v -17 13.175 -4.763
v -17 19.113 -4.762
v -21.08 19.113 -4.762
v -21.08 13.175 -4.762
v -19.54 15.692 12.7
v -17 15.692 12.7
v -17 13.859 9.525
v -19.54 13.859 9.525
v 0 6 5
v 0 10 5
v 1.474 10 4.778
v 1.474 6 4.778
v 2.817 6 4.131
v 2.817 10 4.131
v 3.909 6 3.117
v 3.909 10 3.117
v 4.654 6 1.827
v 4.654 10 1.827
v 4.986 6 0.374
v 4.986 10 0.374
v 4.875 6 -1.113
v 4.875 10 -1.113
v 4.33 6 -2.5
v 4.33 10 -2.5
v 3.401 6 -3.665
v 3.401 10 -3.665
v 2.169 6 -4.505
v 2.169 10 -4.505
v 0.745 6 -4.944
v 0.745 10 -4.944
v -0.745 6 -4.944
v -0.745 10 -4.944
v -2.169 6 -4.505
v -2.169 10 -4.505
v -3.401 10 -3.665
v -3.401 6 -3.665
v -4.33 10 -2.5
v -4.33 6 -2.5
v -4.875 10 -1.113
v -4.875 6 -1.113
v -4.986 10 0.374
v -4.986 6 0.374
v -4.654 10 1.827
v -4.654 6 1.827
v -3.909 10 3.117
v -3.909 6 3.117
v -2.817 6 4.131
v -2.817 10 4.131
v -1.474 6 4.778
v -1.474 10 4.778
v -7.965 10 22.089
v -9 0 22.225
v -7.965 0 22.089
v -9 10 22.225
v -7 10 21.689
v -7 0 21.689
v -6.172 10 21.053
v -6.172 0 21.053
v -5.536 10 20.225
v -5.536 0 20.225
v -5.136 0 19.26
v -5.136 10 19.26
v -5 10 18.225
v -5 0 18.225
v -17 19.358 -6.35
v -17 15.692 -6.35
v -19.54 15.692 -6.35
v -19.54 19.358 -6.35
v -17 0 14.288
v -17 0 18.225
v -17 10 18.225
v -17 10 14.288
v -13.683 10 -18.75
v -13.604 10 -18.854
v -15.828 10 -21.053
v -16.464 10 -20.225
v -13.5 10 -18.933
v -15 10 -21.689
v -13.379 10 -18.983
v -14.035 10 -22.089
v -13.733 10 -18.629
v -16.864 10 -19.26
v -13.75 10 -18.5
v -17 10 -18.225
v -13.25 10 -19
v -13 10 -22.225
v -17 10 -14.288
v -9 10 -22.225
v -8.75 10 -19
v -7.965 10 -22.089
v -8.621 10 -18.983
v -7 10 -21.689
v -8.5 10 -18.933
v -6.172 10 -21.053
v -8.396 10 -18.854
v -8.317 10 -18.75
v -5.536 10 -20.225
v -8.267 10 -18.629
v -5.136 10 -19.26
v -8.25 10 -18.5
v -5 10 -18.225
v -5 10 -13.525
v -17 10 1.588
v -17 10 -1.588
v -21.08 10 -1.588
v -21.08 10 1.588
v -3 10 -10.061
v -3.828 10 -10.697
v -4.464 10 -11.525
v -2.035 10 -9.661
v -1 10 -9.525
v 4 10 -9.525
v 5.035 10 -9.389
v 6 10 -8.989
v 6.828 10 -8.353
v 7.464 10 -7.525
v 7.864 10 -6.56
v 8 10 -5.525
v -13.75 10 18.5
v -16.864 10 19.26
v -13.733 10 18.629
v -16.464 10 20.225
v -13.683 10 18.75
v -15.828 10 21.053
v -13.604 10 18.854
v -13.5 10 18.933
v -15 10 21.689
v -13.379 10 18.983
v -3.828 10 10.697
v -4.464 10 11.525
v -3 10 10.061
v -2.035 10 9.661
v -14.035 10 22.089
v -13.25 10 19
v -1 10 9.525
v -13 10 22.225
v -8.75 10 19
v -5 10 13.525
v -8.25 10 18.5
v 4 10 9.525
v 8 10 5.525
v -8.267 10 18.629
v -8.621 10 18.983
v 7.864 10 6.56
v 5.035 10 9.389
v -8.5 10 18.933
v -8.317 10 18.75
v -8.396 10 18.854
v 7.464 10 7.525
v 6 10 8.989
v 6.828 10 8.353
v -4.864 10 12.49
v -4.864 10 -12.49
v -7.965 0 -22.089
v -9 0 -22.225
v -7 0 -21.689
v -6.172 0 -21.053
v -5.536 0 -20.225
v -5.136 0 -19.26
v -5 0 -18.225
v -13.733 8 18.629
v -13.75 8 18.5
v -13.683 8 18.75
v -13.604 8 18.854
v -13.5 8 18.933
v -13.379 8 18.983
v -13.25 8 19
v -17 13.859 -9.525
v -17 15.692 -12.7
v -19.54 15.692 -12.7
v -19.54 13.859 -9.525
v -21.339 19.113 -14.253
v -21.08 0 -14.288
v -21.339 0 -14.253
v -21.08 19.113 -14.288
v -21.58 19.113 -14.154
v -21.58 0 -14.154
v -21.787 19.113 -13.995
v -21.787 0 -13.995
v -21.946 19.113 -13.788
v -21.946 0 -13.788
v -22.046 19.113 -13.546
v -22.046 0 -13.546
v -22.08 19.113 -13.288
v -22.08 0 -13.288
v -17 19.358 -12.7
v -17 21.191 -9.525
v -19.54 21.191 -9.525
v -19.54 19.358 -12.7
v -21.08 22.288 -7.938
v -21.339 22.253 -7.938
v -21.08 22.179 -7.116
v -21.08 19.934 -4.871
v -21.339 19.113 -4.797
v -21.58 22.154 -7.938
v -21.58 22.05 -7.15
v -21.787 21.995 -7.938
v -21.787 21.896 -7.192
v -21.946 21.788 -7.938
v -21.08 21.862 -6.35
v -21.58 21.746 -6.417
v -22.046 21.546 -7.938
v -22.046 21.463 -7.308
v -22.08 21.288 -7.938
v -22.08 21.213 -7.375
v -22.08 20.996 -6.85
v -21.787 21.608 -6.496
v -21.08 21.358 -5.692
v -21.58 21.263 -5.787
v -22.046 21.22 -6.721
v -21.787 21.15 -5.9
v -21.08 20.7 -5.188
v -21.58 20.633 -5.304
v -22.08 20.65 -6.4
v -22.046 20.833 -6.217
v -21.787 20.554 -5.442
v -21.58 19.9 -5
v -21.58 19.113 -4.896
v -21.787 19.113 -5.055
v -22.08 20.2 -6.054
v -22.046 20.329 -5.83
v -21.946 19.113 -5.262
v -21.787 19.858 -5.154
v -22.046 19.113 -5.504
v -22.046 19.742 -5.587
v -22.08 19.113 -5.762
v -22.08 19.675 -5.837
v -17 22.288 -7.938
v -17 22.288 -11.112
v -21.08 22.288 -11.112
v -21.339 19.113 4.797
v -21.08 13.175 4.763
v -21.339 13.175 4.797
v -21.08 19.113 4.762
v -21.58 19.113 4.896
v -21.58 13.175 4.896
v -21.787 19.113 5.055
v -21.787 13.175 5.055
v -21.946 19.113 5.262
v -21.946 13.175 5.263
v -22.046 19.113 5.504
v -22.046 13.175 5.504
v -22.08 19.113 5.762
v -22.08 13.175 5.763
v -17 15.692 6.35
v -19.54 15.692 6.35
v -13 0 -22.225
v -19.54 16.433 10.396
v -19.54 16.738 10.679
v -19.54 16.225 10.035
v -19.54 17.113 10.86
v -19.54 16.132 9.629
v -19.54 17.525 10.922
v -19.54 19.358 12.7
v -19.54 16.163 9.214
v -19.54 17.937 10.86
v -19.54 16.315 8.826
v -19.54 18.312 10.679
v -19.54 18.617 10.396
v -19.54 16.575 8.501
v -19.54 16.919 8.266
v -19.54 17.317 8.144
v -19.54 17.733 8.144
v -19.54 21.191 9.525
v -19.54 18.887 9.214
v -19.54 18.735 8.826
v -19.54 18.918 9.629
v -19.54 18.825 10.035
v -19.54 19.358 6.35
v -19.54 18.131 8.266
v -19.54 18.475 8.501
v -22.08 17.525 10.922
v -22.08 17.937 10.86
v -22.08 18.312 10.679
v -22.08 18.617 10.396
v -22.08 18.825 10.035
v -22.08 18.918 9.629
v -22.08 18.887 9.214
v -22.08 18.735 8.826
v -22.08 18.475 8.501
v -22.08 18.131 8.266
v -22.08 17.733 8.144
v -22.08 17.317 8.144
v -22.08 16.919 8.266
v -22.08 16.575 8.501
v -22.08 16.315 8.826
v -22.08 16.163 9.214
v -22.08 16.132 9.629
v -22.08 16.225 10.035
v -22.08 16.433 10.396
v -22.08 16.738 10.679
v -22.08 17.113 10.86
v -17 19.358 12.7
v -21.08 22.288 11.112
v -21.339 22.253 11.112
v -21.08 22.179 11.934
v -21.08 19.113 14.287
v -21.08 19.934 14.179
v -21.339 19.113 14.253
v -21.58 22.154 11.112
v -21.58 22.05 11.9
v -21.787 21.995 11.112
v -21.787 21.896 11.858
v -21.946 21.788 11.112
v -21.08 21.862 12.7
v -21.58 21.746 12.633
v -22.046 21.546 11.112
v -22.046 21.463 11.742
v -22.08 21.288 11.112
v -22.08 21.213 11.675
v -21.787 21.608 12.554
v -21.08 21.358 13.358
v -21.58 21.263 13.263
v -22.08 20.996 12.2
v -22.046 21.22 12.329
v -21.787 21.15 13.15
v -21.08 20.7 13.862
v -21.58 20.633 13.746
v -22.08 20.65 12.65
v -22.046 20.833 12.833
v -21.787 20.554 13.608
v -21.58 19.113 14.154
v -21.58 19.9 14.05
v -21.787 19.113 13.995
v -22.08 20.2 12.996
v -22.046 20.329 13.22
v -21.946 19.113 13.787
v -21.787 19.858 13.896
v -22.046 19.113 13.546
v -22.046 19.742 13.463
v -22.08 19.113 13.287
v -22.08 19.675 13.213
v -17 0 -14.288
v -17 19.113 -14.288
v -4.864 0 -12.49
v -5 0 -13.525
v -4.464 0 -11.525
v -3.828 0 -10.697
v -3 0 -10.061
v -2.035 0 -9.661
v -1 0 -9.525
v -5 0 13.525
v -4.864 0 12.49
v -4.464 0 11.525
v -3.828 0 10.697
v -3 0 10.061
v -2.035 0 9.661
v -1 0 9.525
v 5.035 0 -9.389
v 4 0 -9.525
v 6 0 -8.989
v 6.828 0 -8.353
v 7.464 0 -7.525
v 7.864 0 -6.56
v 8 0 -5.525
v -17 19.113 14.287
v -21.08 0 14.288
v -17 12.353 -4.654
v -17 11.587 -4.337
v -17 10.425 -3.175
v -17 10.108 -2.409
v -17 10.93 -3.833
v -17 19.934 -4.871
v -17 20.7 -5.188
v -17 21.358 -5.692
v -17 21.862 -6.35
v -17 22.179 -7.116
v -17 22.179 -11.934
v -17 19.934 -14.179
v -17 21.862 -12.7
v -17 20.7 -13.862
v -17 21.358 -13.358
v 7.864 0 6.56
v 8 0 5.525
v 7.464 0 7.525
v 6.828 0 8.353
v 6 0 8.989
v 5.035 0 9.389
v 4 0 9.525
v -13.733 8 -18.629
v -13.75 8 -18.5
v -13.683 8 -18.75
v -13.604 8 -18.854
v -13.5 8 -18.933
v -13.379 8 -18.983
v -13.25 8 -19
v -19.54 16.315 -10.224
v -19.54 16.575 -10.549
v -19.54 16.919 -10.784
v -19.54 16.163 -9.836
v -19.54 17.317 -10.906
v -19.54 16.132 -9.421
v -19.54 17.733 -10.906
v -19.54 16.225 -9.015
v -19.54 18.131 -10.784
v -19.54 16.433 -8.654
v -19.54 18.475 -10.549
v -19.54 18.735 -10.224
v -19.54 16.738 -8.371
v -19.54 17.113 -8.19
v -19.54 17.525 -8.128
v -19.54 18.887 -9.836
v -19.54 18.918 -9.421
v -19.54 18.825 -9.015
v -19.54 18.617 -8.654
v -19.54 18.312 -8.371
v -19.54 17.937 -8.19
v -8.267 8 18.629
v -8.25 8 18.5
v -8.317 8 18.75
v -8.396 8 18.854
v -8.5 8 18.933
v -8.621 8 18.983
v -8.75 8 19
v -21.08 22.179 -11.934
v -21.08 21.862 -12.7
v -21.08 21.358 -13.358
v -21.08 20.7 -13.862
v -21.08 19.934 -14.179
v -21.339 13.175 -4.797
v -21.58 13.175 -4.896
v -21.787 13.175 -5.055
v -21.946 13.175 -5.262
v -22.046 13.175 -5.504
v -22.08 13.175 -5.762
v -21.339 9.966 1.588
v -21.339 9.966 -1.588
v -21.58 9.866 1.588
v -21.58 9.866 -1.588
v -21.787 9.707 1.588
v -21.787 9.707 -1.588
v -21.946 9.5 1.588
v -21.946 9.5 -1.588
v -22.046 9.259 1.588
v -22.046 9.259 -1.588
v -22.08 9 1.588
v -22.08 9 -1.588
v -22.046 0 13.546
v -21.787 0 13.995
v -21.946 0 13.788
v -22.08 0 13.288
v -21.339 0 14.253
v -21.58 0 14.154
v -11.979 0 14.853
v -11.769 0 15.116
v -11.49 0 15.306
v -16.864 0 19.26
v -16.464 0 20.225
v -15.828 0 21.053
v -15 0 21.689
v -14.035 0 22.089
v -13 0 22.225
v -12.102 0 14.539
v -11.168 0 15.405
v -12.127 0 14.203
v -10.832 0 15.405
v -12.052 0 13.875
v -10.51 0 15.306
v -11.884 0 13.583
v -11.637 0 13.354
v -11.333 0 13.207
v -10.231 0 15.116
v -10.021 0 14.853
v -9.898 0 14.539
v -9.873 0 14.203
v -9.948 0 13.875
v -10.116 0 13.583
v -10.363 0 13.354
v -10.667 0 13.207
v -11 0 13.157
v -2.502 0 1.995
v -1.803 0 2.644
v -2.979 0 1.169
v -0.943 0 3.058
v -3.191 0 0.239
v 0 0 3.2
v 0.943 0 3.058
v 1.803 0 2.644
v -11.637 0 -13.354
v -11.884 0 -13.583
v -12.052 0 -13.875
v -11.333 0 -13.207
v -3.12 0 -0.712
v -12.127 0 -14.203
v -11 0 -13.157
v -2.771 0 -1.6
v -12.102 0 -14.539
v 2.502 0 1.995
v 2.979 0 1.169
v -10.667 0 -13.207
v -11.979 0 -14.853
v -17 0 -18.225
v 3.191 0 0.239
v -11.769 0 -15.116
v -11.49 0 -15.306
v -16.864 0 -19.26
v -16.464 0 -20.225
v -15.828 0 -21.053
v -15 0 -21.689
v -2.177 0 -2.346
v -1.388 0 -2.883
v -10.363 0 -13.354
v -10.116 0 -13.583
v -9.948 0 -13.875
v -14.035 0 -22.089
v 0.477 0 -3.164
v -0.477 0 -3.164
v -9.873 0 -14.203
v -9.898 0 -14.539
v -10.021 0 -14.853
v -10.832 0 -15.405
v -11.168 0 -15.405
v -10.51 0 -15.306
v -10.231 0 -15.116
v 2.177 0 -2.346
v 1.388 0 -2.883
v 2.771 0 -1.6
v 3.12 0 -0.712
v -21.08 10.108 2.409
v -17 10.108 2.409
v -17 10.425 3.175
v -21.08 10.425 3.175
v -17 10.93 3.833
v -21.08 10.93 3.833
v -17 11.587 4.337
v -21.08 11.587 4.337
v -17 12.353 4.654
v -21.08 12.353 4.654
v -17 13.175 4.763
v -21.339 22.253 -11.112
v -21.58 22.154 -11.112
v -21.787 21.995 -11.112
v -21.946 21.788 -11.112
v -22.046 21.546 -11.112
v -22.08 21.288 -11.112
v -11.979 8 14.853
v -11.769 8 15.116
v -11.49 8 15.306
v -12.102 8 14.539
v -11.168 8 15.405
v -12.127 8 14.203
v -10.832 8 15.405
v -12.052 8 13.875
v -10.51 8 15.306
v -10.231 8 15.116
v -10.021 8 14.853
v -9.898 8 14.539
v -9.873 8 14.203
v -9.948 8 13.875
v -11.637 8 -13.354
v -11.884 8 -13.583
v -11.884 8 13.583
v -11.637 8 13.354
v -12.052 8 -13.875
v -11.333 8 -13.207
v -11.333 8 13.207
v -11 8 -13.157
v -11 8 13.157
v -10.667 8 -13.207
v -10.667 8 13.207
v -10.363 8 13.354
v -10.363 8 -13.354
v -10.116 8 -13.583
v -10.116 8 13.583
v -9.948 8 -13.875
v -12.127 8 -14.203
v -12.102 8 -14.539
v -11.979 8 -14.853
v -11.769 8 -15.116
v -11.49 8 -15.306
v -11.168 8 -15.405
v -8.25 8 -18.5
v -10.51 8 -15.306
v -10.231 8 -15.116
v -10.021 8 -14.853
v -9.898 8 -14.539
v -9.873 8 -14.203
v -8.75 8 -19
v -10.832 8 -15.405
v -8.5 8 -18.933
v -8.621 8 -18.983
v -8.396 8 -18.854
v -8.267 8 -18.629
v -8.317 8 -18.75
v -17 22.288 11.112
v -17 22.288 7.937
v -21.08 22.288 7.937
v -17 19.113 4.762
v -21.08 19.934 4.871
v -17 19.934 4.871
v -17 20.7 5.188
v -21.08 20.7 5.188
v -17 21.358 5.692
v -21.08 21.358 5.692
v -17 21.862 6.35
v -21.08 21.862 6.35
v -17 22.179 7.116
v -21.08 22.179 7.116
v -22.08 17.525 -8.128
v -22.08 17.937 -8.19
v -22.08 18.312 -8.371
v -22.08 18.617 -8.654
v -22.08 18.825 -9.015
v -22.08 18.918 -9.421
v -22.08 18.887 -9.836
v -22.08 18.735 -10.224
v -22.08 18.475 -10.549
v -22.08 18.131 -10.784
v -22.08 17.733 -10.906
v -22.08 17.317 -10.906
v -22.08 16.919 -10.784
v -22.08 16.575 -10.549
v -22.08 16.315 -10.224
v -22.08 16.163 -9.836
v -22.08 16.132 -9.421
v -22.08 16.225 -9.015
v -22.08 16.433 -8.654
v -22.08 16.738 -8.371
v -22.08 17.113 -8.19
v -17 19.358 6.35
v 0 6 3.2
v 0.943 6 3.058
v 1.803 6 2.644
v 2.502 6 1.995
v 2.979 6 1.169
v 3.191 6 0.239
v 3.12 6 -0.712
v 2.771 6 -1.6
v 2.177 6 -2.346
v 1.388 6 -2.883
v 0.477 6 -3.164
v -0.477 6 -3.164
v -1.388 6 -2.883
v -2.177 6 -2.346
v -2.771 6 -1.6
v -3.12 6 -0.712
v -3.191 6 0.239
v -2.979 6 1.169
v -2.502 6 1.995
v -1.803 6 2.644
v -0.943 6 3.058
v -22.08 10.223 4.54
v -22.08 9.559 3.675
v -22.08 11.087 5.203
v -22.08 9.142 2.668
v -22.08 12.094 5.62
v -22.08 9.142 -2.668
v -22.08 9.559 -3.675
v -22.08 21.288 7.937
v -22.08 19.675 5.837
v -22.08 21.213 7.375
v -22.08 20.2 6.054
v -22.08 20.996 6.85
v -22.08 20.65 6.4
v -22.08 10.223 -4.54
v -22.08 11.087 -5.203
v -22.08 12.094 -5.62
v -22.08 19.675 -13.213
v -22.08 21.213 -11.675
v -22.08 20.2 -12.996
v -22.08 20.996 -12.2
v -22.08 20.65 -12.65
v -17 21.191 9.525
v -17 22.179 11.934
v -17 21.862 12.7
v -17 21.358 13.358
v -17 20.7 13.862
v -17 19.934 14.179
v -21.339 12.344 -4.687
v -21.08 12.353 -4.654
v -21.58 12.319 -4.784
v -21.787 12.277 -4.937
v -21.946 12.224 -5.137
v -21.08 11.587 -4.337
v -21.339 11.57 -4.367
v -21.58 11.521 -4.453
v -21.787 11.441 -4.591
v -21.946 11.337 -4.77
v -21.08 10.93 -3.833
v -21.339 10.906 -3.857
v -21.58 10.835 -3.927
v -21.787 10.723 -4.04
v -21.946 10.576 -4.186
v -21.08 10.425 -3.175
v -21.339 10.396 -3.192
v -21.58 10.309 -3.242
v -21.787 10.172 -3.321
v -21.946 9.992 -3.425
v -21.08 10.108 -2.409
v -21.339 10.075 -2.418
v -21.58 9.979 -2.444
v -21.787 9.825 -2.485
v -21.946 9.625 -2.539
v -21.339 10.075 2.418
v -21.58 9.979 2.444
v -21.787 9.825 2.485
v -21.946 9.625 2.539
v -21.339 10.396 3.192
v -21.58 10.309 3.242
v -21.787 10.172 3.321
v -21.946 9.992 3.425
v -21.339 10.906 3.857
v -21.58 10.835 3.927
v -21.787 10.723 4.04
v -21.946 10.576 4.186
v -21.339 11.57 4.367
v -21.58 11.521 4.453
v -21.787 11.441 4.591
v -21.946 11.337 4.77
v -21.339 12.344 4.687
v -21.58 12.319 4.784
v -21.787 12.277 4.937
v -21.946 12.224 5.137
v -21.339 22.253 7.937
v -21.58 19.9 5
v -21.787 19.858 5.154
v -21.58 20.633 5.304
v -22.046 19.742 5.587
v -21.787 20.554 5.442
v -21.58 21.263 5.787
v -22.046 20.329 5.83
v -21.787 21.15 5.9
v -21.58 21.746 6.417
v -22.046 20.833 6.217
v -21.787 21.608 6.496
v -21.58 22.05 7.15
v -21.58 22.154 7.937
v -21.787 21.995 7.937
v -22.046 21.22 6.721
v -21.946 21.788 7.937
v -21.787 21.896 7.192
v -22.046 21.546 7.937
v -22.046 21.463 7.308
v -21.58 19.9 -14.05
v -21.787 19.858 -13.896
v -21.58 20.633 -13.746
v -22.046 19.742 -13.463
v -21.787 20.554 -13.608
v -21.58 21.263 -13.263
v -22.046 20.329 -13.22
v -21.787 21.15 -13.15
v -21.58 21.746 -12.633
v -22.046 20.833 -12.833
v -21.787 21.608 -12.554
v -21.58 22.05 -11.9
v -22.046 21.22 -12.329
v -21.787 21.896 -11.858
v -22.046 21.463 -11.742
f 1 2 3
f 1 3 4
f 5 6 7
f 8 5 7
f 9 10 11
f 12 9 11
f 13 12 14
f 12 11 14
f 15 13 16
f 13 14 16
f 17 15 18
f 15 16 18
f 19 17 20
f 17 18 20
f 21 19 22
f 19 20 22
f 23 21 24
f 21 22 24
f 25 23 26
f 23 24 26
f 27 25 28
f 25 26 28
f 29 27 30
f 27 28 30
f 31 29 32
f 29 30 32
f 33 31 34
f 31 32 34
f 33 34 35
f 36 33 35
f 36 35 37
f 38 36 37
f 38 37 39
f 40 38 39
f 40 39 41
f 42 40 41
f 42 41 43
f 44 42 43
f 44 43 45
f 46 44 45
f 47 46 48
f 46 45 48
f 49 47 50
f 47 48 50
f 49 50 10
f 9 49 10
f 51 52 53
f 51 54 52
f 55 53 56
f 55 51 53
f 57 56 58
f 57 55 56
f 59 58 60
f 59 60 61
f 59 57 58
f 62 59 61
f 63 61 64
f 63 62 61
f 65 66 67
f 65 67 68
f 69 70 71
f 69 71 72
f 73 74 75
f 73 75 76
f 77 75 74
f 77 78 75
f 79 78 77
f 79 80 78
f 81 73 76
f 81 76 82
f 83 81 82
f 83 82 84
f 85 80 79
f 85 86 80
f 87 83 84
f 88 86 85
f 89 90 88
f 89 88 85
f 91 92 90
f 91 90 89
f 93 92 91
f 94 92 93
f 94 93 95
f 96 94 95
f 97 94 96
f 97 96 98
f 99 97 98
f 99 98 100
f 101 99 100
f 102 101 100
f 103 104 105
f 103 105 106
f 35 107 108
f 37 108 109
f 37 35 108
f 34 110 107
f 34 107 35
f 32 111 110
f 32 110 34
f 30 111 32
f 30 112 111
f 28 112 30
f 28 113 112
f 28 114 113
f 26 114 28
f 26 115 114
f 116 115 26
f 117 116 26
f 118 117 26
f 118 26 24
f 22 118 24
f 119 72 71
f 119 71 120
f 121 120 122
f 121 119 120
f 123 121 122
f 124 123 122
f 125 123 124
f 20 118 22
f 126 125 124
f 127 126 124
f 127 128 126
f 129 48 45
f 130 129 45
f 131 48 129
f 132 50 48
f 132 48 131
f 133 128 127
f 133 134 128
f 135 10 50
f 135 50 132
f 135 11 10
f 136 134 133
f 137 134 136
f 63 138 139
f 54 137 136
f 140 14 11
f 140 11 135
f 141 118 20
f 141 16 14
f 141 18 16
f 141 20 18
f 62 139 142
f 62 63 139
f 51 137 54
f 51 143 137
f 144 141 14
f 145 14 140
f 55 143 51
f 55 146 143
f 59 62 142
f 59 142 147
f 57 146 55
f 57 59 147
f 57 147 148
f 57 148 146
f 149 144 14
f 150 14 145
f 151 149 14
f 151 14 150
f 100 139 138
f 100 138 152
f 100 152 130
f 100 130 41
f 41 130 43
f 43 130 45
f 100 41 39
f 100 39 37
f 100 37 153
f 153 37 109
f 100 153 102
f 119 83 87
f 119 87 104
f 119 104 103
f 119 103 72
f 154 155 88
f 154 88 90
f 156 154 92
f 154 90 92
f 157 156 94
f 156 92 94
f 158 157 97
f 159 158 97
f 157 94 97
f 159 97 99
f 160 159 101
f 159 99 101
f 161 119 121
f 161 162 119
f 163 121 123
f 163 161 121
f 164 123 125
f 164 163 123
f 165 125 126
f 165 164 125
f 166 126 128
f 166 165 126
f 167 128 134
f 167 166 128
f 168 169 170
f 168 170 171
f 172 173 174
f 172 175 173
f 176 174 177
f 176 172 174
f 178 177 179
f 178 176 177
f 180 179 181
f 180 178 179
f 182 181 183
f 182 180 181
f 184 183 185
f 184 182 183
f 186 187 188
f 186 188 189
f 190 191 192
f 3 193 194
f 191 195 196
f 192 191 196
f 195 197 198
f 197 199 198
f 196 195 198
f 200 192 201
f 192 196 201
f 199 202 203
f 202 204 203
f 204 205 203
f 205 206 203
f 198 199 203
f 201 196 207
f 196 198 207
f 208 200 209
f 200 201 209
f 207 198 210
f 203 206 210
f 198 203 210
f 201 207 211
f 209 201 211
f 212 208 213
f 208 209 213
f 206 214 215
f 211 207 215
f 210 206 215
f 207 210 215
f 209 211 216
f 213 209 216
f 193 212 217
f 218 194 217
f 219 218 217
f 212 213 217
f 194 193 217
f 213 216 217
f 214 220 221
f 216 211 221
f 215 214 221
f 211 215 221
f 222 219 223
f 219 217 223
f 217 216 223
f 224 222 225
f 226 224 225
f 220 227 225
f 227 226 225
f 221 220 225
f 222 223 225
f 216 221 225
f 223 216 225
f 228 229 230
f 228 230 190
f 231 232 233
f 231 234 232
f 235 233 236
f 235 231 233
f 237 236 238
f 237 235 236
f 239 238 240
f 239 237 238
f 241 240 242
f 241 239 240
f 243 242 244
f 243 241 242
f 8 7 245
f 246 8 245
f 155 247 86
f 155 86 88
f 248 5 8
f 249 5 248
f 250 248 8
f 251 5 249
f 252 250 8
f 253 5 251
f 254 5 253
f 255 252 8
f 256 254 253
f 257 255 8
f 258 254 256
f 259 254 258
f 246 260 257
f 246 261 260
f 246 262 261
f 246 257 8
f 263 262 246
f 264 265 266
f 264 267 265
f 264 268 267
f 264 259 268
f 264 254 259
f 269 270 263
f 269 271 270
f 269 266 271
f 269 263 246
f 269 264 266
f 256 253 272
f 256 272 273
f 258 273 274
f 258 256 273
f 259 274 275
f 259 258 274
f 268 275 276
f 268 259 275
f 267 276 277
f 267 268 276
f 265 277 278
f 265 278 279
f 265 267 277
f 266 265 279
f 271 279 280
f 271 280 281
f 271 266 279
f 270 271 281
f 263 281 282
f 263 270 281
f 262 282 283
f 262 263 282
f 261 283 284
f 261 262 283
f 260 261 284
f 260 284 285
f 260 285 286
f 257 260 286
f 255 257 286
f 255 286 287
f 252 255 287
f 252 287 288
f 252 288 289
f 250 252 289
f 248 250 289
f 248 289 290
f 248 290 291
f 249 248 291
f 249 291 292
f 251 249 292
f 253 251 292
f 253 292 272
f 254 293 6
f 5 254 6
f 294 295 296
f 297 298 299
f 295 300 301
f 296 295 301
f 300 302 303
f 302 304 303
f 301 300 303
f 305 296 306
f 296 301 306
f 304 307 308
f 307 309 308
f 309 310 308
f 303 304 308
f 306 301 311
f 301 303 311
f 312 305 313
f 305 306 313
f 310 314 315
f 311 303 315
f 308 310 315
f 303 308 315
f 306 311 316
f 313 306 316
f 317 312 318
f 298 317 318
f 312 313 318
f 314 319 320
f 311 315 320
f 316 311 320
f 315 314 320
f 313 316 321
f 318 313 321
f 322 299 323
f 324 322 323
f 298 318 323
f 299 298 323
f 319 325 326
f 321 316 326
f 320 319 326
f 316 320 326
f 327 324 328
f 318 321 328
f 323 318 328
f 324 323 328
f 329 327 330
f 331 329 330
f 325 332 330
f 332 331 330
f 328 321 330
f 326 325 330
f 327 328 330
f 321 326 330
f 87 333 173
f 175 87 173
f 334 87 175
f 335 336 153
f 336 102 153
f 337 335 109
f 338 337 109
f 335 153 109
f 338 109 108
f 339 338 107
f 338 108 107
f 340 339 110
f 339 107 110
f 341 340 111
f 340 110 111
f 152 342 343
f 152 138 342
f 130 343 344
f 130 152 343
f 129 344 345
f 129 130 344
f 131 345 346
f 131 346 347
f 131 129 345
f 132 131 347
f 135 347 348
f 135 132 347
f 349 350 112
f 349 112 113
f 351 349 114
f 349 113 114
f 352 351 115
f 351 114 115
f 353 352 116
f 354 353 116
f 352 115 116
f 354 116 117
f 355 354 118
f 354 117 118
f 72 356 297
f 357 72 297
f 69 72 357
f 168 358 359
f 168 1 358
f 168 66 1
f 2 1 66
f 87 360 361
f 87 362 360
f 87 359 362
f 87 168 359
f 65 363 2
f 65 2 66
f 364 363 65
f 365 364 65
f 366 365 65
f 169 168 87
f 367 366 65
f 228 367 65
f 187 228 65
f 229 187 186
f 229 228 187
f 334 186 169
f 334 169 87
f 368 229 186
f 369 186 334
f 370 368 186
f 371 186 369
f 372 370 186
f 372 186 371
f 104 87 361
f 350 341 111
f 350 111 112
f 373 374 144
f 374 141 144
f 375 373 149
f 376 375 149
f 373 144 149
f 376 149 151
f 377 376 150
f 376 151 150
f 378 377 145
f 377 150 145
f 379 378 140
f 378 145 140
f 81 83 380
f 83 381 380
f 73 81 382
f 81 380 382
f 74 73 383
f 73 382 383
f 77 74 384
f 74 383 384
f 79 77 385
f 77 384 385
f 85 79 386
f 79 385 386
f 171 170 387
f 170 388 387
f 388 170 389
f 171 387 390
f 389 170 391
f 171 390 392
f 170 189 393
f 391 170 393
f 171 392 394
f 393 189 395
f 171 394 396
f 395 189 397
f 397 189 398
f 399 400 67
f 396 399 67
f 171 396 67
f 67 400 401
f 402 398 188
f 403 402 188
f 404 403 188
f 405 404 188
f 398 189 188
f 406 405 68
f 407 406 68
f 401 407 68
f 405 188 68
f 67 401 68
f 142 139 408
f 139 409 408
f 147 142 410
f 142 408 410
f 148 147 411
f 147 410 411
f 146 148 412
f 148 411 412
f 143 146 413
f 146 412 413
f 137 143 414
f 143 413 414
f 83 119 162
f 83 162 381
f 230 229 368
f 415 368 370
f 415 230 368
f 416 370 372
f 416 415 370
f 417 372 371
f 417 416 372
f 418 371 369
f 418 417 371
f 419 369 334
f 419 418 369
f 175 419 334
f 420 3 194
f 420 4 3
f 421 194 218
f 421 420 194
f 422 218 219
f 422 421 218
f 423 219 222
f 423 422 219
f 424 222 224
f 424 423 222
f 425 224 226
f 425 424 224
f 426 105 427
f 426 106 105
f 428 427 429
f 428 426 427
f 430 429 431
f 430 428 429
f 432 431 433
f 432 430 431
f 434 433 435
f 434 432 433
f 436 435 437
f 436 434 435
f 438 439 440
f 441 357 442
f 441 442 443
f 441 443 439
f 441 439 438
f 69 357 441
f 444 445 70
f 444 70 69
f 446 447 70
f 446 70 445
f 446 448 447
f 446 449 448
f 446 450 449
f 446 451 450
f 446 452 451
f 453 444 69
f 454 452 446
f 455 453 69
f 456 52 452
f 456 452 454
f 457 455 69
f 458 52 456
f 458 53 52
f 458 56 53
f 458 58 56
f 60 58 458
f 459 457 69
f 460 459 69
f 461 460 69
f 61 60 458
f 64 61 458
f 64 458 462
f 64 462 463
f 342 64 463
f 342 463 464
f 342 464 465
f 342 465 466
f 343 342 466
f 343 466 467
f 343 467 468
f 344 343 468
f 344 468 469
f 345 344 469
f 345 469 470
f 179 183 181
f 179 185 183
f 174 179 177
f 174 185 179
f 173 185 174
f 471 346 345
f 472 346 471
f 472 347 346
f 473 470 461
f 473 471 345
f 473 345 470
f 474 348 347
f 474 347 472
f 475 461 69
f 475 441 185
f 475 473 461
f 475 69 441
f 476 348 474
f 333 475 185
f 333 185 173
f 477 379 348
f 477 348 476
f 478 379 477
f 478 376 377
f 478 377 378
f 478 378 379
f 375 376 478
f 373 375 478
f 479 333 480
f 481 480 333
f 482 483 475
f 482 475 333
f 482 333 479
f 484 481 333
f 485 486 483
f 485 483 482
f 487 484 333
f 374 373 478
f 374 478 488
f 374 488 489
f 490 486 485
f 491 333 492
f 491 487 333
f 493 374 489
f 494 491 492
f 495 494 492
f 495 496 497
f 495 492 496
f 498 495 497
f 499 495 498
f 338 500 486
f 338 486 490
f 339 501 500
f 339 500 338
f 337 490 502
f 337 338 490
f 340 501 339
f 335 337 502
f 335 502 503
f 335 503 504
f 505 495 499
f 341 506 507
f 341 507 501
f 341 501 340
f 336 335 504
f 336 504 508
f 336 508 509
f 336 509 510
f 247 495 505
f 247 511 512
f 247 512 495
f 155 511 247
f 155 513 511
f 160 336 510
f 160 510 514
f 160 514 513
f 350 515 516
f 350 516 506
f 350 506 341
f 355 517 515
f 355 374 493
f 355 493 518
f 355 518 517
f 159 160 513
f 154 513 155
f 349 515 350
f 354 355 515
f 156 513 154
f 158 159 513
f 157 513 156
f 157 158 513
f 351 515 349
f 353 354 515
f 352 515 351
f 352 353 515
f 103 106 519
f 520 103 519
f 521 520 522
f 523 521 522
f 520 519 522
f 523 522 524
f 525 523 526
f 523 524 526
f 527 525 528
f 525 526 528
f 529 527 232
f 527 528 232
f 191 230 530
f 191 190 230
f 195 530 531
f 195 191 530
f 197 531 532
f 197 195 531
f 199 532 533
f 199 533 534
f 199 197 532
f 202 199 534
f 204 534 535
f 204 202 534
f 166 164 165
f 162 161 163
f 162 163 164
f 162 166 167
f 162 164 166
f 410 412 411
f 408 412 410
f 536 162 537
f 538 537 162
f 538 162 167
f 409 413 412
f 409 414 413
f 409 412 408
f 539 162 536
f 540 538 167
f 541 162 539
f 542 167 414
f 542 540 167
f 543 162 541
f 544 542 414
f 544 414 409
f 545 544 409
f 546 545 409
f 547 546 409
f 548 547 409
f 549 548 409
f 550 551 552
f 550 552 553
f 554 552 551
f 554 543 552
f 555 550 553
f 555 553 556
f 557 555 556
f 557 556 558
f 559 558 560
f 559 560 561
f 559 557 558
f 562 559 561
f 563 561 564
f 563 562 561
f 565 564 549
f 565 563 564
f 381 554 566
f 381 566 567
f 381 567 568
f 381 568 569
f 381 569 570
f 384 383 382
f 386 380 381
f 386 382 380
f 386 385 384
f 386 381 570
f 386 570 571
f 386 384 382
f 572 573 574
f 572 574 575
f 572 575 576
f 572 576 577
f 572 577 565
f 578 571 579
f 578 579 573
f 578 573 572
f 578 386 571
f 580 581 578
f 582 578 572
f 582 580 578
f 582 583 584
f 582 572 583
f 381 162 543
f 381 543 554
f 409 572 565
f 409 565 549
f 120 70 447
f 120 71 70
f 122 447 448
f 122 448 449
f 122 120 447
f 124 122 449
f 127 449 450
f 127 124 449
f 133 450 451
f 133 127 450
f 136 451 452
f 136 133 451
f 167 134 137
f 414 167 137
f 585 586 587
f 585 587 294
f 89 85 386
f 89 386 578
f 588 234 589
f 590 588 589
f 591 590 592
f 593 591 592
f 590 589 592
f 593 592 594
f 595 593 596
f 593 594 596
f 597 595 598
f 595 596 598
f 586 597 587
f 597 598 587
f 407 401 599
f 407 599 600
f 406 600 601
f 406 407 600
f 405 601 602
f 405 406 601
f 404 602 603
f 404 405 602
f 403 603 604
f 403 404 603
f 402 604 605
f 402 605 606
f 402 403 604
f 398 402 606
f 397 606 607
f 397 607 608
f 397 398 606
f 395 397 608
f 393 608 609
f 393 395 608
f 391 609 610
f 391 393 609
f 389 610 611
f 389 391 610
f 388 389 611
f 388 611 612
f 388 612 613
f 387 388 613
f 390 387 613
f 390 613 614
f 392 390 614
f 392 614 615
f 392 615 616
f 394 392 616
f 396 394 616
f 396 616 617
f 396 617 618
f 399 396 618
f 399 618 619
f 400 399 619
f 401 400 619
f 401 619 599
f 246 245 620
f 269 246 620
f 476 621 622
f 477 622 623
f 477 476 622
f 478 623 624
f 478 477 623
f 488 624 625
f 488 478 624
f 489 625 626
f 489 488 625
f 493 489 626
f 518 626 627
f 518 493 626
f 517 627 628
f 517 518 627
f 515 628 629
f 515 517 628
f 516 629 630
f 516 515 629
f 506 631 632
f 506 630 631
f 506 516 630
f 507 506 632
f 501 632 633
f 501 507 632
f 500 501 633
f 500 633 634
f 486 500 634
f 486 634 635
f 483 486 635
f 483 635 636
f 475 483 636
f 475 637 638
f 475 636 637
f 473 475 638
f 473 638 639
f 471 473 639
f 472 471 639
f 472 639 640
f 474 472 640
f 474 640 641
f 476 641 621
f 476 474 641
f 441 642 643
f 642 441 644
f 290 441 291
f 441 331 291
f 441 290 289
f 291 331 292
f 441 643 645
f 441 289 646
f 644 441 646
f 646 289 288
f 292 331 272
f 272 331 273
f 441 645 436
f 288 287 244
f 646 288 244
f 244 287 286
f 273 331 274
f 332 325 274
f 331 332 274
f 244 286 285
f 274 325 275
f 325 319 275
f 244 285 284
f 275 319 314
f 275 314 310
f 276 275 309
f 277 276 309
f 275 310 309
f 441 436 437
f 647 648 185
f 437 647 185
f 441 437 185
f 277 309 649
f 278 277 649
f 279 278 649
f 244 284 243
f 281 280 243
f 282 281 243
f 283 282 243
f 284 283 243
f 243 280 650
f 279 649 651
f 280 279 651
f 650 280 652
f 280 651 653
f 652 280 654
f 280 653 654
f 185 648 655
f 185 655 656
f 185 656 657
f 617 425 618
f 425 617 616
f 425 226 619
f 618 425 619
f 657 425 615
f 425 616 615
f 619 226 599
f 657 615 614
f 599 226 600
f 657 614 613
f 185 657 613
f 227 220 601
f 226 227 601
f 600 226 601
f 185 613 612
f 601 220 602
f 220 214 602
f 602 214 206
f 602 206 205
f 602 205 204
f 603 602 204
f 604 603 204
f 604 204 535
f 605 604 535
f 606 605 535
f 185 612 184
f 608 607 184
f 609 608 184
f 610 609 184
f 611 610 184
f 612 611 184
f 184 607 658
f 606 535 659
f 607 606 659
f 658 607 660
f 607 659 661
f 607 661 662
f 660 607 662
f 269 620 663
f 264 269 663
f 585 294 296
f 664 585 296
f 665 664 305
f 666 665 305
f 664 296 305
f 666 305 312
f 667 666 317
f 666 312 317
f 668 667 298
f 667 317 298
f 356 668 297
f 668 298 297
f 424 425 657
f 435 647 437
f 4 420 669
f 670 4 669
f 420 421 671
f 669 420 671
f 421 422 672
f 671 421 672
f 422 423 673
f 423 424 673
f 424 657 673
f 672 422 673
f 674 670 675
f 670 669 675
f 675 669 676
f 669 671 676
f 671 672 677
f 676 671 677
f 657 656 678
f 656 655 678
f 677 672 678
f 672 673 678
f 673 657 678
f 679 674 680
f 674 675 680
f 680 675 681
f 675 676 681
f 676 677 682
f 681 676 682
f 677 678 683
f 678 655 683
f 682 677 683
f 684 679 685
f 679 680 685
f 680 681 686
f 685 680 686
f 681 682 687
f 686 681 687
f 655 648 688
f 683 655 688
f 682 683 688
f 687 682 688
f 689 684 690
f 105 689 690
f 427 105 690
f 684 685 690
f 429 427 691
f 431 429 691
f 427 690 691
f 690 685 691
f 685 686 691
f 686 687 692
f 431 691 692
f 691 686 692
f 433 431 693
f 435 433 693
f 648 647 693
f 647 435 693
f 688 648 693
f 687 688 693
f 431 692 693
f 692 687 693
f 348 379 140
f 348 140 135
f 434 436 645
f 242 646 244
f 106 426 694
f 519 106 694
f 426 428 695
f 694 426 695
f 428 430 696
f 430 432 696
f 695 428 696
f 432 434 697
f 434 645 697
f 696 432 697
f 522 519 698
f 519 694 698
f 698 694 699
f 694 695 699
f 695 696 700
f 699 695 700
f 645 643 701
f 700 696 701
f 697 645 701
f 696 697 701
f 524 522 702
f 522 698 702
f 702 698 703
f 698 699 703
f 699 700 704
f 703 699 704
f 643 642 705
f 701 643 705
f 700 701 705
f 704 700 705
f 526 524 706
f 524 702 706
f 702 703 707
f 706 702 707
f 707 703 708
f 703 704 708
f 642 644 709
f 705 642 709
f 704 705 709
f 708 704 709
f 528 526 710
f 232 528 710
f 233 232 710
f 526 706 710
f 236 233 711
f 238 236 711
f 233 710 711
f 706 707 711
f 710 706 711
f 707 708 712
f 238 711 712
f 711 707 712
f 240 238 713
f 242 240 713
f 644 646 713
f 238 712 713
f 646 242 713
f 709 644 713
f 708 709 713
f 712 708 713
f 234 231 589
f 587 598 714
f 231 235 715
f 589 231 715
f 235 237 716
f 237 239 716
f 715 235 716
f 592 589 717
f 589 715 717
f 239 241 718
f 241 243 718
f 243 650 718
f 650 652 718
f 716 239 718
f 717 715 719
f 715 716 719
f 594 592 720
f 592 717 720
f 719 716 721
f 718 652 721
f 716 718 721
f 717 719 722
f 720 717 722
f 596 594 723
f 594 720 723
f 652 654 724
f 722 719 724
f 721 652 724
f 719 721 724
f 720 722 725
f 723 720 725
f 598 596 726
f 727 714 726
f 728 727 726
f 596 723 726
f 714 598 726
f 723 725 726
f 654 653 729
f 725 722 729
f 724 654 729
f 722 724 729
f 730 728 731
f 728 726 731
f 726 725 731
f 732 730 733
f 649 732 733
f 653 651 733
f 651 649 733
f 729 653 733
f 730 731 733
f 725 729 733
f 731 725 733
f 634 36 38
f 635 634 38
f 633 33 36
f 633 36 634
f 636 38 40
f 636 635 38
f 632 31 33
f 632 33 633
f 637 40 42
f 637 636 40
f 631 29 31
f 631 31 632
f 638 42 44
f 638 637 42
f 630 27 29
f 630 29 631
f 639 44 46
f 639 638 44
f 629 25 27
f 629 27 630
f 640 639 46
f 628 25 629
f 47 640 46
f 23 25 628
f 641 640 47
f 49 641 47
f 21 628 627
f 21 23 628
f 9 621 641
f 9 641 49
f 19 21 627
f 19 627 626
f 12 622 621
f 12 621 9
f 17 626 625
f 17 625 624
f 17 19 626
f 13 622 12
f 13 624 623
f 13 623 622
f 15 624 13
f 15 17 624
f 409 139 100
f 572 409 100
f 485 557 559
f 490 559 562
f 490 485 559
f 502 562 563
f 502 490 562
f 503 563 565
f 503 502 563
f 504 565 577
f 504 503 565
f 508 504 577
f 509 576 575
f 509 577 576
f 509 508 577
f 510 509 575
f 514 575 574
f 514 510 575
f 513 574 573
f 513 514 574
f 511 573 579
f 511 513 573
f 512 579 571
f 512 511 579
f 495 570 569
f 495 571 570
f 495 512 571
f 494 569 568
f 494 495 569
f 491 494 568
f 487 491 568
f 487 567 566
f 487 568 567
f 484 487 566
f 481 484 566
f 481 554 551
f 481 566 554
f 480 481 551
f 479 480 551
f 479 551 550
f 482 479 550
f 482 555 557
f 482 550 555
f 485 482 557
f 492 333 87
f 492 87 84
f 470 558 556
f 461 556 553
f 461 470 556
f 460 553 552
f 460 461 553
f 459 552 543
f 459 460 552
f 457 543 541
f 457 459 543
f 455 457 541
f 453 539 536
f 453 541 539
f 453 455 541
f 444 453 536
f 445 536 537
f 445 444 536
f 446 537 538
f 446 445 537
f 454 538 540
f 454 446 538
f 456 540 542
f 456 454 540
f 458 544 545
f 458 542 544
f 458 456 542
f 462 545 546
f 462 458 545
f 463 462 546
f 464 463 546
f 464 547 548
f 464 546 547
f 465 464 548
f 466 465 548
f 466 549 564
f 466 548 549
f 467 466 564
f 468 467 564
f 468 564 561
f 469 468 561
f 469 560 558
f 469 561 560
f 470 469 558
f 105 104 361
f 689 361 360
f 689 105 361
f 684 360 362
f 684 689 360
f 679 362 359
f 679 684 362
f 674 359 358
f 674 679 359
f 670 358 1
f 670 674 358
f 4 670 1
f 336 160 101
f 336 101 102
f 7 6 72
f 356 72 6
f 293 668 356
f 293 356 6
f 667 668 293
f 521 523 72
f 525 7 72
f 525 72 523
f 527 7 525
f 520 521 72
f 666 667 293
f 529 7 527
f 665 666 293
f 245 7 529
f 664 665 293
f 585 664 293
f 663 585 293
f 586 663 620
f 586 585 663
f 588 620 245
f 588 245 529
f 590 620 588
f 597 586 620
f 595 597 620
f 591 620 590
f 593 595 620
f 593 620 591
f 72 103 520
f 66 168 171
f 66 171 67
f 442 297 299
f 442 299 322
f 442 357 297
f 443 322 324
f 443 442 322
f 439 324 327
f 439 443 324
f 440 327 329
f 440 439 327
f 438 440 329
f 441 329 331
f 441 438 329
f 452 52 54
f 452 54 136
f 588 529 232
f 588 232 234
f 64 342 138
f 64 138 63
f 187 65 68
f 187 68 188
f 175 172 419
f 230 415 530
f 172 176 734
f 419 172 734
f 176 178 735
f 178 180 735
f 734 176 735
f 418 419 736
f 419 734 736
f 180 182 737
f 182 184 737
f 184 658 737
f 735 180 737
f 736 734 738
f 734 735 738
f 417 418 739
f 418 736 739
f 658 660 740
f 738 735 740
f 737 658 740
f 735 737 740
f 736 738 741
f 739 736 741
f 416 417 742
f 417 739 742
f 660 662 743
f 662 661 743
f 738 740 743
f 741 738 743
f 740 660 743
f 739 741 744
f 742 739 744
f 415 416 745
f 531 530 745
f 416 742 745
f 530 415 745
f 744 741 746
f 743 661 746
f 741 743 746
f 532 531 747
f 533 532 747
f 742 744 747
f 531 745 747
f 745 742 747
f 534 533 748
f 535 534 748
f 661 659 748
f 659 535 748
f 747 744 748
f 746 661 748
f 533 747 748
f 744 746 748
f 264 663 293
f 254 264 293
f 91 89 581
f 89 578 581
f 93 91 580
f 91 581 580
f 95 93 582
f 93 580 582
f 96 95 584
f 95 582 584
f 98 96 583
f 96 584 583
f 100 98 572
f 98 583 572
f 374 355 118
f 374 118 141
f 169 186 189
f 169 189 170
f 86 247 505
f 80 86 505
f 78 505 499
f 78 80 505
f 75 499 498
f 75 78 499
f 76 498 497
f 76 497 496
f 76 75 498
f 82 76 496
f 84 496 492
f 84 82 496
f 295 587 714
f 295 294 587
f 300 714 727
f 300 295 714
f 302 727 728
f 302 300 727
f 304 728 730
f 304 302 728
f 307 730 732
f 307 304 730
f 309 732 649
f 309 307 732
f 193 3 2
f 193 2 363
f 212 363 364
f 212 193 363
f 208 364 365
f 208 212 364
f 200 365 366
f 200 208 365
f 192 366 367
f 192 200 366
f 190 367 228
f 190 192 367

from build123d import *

# Parameters (mm, degrees)
SKETCH1_R           = 3.2
SKETCH1_R_2         = 1.1303
BOSS_EXTRUDE1_DEPTH = 10
SKETCH2_W           = 5.5
SKETCH2_H           = 38
CUT_EXTRUDE1_DEPTH  = 2
FILLET3_R           = 0.5
SKETCH5_R           = 5
CUT_EXTRUDE2_DEPTH  = 4
FILLET1_R           = 4
SKETCH4_R           = 1.397
BOSS_EXTRUDE2_DEPTH = 5.08
CUT_EXTRUDE3_DEPTH  = 2.54
FILLET5_R           = 3.175
FILLET4_R           = 1


with BuildPart() as part:
    # Sketch1 → Boss-Extrude1 (new body)
    with BuildSketch(Plane(origin=(0, 0, 0), x_dir=(1, 0, 0), z_dir=(0, 1, 0))):
        Polygon((-17, 22.225), (-5, 22.225), (-5, 9.525), (8, 9.525), (8, -9.525), (-5, -9.525), (-5, -22.225), (-17, -22.225), align=None)
        with Locations(Location((0, 0, 0), (0, 0, 270))):
            Circle(SKETCH1_R, mode=Mode.SUBTRACT)
        with Locations(Location((-11, 14.2875, 0), (0, 0, 270))):
            Circle(SKETCH1_R_2, mode=Mode.SUBTRACT)
        with Locations(Location((-11, -14.2875, 0), (0, 0, 90))):
            Circle(SKETCH1_R_2, mode=Mode.SUBTRACT)
    extrude(amount=BOSS_EXTRUDE1_DEPTH)

    # Sketch2 → Cut-Extrude1 (cut)
    with BuildSketch(Plane(origin=(0, 10, 0), x_dir=(1, 0, 0), z_dir=(0, 1, 0))):
        with Locations((-11, 0)):
            Rectangle(SKETCH2_W, SKETCH2_H)
    extrude(amount=-CUT_EXTRUDE1_DEPTH, mode=Mode.SUBTRACT)

    # Fillet3
    fillet3_edges = [part.edges().sort_by_distance(p)[0] for p in [
        (-13.75, 9, 19),
        (-13.75, 9, -19),
        (-8.25, 9, -19),
        (-8.25, 9, 19),
    ]]
    fillet(fillet3_edges, radius=FILLET3_R)

    # Sketch5 → Cut-Extrude2 (cut)
    with BuildSketch(Plane(origin=(0, 10, 0), x_dir=(1, 0, 0), z_dir=(0, 1, 0))):
        with Locations(Location((0, 0, 0), (0, 0, 270))):
            Circle(SKETCH5_R)
    extrude(amount=-CUT_EXTRUDE2_DEPTH, mode=Mode.SUBTRACT)

    # Fillet1
    fillet1_edges = [part.edges().sort_by_distance(p)[0] for p in [
        (-17, 5, 22.225),
        (-17, 5, -22.225),
        (-5, 5, -22.225),
        (-5, 5, -9.525),
        (8, 5, -9.525),
        (8, 5, 9.525),
        (-5, 5, 9.525),
        (-5, 5, 22.225),
    ]]
    fillet(fillet1_edges, radius=FILLET1_R)

    # Sketch4 → Boss-Extrude2 (add)
    with BuildSketch(Plane.ZY.offset(17)):
        Polygon((-4.7625, 10), (4.7625, 10), (4.7625, 22.2875), (14.2875, 22.2875), (14.2875, 0), (-14.2875, 0), (-14.2875, 22.2875), (-4.7625, 22.2875), align=None)
        with Locations((-9.525, 17.525)):
            Circle(SKETCH4_R, mode=Mode.SUBTRACT)
        with Locations((9.525, 17.525)):
            Circle(SKETCH4_R, mode=Mode.SUBTRACT)
    extrude(amount=BOSS_EXTRUDE2_DEPTH)

    # Sketch6 → Cut-Extrude3 (cut)
    with BuildSketch(Plane(origin=(-17, 0, 0), x_dir=(0, 0, -1), z_dir=(1, 0, 0))):
        Polygon((-6.35, 15.691912895), (-6.35, 19.358087105), (-9.525, 21.191174209), (-12.7, 19.358087105), (-12.7, 15.691912895), (-9.525, 13.858825791), align=None)
    cut_extrude3 = extrude(amount=-CUT_EXTRUDE3_DEPTH, mode=Mode.SUBTRACT)

    # Mirror1: Cut-Extrude3 across plane
    add(cut_extrude3.mirror(Plane.XY), mode=Mode.SUBTRACT)

    # Fillet5
    fillet5_edges = [part.edges().sort_by_distance(p)[0] for p in [
        (-19.54, 22.2875, 14.2875),
        (-19.54, 22.2875, 4.7625),
        (-19.54, 10, 4.7625),
        (-19.54, 10, -4.7625),
        (-19.54, 22.2875, -4.7625),
        (-19.54, 22.2875, -14.2875),
    ]]
    fillet(fillet5_edges, radius=FILLET5_R)

    # Fillet4
    fillet4_edges = [part.edges().sort_by_distance(p)[0] for p in [
        (-22.08, 9.55625, 14.2875),
        (-22.08, 10, 0),
        (-22.08, 16.14375, 4.7625),
        (-22.08, 16.14375, -4.7625),
        (-22.08, 22.2875, 9.525),
        (-22.08, 22.2875, -9.525),
        (-22.08, 9.55625, -14.2875),
        (-22.08, 21.35756403, -13.35756403),
        (-22.08, 21.35756403, -5.69243597),
        (-22.08, 21.35756403, 5.69243597),
        (-22.08, 21.35756403, 13.35756403),
        (-22.08, 10.92993597, 3.83256403),
        (-22.08, 10.92993597, -3.83256403),
    ]]
    fillet(fillet4_edges, radius=FILLET4_R)


solid = part.part
